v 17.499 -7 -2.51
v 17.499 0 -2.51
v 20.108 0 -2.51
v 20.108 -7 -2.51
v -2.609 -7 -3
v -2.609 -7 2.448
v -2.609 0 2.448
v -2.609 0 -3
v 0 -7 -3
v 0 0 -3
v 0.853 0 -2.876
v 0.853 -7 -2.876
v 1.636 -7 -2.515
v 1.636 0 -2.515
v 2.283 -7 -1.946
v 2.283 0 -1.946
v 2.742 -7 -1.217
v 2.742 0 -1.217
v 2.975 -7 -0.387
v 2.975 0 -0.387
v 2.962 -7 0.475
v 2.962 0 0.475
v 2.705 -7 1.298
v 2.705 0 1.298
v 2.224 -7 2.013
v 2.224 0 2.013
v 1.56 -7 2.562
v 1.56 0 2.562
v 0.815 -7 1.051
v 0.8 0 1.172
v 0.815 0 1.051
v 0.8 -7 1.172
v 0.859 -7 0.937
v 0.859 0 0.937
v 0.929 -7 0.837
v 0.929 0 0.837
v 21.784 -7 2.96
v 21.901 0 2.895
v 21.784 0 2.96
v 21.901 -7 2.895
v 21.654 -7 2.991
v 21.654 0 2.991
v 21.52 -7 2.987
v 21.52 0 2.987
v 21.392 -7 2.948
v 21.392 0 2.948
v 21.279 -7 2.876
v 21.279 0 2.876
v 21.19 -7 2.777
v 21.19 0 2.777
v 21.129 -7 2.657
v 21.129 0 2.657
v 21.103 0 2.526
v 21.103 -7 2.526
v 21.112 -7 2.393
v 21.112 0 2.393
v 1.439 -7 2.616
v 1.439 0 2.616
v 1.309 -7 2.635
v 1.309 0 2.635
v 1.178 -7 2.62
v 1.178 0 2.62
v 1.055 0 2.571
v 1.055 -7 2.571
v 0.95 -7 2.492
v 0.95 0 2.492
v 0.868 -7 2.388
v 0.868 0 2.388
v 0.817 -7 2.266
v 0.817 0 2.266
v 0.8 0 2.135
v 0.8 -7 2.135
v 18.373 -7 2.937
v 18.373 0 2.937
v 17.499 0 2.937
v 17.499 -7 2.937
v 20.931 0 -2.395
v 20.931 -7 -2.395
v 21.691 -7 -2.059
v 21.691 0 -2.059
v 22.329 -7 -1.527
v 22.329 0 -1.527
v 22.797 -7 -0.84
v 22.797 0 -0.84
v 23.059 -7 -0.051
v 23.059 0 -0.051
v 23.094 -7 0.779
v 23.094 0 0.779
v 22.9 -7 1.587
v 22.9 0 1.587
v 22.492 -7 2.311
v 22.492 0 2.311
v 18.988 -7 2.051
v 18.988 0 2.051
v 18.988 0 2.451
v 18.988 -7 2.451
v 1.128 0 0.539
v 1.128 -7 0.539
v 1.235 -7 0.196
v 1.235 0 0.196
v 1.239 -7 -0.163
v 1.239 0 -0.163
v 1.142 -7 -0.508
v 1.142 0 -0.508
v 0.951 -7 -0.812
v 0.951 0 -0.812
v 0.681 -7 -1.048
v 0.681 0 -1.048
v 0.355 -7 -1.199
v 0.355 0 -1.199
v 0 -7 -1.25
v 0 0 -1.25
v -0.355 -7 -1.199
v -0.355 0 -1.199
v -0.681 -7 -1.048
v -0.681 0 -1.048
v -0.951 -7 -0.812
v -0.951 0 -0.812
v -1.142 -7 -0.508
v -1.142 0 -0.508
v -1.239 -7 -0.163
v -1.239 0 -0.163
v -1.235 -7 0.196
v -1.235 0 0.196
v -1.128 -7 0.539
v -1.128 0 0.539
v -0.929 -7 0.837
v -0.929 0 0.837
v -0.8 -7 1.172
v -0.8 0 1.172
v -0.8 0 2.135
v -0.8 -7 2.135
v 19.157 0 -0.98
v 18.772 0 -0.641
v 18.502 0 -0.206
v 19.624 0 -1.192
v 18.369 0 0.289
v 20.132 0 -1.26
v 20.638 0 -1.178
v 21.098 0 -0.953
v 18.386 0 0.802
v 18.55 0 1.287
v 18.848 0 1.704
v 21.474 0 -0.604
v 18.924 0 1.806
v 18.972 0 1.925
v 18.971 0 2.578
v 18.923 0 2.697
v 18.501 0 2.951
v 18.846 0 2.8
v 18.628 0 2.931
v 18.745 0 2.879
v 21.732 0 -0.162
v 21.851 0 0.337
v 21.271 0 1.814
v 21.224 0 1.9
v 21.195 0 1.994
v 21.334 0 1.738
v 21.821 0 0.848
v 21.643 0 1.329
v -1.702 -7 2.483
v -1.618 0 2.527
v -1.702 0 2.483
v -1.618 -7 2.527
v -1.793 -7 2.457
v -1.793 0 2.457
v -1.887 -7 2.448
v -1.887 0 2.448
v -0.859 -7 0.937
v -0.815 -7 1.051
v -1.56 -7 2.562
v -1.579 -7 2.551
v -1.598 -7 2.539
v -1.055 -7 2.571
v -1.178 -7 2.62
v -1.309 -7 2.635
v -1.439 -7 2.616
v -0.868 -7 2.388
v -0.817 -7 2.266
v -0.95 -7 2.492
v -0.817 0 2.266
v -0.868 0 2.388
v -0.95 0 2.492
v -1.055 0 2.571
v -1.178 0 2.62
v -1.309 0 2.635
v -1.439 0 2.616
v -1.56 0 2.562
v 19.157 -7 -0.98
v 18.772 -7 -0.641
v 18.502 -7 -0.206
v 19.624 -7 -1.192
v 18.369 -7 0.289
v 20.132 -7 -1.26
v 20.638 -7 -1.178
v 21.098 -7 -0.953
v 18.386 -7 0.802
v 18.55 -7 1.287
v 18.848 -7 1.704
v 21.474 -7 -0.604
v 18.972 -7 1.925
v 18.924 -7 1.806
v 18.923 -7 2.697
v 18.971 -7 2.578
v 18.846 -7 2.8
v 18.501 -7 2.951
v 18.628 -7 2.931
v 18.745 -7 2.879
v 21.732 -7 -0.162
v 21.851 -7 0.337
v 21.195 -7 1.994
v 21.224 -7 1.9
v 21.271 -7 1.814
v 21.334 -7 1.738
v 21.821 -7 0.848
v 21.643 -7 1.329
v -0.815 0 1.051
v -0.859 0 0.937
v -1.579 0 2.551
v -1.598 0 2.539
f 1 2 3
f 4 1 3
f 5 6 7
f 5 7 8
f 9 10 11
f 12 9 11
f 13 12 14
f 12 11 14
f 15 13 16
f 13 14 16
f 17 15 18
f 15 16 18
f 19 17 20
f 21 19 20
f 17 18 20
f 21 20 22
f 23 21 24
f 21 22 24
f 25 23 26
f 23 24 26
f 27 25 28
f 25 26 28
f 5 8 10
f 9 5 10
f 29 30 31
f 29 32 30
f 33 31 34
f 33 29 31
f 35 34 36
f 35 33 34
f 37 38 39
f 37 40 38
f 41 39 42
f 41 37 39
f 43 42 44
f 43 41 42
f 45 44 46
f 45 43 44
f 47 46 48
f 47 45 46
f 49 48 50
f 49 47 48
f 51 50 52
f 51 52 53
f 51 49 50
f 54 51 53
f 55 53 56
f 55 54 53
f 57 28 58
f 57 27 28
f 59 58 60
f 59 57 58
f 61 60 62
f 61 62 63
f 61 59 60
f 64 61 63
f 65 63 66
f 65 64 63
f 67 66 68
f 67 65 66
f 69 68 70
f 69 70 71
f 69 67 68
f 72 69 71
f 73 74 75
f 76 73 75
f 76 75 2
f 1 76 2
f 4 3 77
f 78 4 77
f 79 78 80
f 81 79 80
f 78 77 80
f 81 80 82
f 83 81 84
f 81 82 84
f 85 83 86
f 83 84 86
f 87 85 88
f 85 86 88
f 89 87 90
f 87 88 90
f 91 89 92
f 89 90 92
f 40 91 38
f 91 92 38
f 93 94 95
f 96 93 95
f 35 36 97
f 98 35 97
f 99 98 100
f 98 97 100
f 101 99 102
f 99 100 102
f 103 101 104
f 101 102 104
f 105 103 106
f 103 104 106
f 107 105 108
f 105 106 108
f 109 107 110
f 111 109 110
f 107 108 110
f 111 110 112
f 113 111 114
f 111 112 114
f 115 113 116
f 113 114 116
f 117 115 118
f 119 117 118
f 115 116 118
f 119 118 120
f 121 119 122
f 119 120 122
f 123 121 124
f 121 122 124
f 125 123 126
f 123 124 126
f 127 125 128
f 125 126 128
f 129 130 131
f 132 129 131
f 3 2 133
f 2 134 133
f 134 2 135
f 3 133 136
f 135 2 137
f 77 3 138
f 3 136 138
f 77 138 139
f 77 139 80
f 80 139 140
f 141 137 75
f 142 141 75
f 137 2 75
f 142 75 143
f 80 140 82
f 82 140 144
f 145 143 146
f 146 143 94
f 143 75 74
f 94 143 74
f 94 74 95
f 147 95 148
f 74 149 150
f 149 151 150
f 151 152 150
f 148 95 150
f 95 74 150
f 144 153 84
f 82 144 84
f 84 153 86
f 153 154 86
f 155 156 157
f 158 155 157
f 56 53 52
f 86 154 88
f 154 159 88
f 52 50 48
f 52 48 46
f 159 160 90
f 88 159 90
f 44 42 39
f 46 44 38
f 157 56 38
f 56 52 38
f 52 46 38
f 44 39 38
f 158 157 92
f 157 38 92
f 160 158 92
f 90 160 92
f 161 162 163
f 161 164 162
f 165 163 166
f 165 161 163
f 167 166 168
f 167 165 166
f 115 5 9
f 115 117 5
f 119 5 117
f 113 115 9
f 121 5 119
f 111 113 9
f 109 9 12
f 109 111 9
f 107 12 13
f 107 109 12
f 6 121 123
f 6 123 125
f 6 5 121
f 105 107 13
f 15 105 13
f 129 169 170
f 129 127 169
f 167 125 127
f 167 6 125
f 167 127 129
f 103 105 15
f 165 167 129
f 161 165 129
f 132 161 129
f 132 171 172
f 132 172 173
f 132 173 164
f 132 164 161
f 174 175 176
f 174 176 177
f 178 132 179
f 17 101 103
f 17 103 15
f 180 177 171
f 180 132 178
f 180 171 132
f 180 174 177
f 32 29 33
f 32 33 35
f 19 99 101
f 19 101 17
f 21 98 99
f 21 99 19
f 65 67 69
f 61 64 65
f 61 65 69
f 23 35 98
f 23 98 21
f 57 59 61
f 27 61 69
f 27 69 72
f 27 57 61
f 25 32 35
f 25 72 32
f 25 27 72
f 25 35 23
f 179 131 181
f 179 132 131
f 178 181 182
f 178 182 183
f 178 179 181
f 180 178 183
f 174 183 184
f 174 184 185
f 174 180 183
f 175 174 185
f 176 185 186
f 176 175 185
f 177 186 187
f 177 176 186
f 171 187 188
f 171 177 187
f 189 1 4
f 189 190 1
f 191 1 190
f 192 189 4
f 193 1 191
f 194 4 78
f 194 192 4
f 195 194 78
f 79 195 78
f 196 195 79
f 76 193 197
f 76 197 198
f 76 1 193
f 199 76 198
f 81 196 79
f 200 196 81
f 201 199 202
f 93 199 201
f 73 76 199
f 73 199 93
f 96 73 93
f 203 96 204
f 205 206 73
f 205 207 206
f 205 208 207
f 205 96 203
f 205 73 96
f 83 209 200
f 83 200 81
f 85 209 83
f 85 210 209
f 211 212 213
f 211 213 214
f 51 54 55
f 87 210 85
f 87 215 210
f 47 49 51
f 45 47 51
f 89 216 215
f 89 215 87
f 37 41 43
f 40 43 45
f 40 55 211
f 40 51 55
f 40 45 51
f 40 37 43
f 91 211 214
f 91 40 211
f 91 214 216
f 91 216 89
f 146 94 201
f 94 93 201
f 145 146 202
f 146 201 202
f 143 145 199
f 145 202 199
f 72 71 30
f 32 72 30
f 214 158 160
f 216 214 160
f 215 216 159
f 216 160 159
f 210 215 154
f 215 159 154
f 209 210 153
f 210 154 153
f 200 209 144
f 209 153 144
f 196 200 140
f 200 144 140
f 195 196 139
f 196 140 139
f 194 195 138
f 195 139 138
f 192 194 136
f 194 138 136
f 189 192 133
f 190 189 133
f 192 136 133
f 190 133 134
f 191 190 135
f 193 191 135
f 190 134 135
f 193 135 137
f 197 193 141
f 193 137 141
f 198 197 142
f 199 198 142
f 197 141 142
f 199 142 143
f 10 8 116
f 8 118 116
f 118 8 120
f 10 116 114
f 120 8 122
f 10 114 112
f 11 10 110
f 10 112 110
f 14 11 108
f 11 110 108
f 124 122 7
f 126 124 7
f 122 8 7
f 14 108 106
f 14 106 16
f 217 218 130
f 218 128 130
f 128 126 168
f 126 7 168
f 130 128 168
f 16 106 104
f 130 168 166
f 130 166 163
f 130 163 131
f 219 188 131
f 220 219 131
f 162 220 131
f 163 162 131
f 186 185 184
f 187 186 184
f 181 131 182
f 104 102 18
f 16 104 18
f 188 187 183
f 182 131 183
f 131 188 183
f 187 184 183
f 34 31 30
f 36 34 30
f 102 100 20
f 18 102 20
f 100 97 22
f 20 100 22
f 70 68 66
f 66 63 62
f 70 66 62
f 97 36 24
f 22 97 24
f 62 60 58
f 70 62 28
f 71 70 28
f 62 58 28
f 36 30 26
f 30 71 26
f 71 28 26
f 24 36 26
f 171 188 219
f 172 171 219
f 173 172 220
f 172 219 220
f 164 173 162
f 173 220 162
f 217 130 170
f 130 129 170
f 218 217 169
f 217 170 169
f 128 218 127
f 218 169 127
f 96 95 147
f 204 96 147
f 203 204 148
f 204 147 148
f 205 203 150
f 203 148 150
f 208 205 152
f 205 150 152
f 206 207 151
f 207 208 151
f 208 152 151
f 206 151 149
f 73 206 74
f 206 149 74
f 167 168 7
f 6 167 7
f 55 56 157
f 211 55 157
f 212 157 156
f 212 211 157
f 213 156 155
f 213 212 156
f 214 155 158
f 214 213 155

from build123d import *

# Parameters (mm, degrees)
F1_DEPTH    = 7
F2_R        = 0.5
F2_2_R      = 0.5
F3_T1_DEPTH = 11.1105344099


# Not quite as in the source:
# - a fillet or chamfer that OpenCascade refuses, or shapes differently, is made with other operations: its cross-section is extruded or revolved along the edge and cut away or added


with BuildPart() as f1:
    # F0 (on Front) → F1 (new body)
    with BuildSketch(Plane.XZ):
        with BuildLine():
            Line((-0.8, 0.9604686356), (-0.8, 2.891366459))
            ThreePointArc((-0.8, 2.891366459), (-1.2865824769, 2.7101117191), (-1.734622404, 2.4476693232))
            Line((-1.734622404, 2.4476693232), (-2.6087118245, 2.4476693232))
            Line((-2.6087118245, 2.4476693232), (-2.6087118245, 1.4814258728))
            Line((-2.6087118245, 1.4814258728), (-2.6087118245, -1.4814258728))
            Line((-2.6087118245, -1.4814258728), (-2.6087118245, -3))
            Line((-2.6087118245, -3), (0, -3))
            ThreePointArc((0, -3), (2.9727175595, -0.4036710437), (0.8, 2.891366459))
            Line((0.8, 2.891366459), (0.8, 0.9604686356))
            ThreePointArc((0.8, 0.9604686356), (0, -1.25), (-0.8, 0.9604686356))
        make_face()
    extrude(amount=F1_DEPTH)

    # F2
    f2_edges = [f1.edges().sort_by_distance(p)[0] for p in [
        (-0.8, -3.5, 2.891366),
        (-0.8, -3.5, 0.960469),
        (0.8, -3.5, 0.960469),
        (0.8, -3.5, 2.891366),
        (-1.734622, -3.5, 2.447669),
    ]]
    fillet(f2_edges, radius=F2_R)


with BuildPart() as f1b:
    # F0 (on Front) → F1, piece 2 (new body)
    with BuildSketch(Plane.XZ):
        with BuildLine():
            Line((18.987874046, 1.8343775348), (18.987874046, 3.2728132508))
            ThreePointArc((18.987874046, 3.2728132508), (18.6707434577, 3.1230948845), (18.373251642, 2.9373907681))
            Line((18.373251642, 2.9373907681), (17.4991622215, 2.9373907681))
            Line((17.4991622215, 2.9373907681), (17.4991622215, 1.9711473178))
            Line((17.4991622215, 1.9711473178), (17.4991622215, -0.9917044279))
            Line((17.4991622215, -0.9917044279), (17.4991622215, -2.5102785551))
            Line((17.4991622215, -2.5102785551), (20.107874046, -2.5102785551))
            ThreePointArc((20.107874046, -2.5102785551), (23.0805916054, 0.0860504012), (20.907874046, 3.3810879039))
            Line((20.907874046, 3.3810879039), (21.227874046, 1.8343775348))
            ThreePointArc((21.227874046, 1.8343775348), (20.107874046, -1.2602785551), (18.987874046, 1.8343775348))
        make_face()
    extrude(amount=F1_DEPTH)

    # F2#2
    f2_2_edges = [f1b.edges().sort_by_distance(p)[0] for p in [
        (18.987874, -3.5, 1.834378),
        (20.907874, -3.5, 3.381088),
        (21.227874, -3.5, 1.834378),
    ]]
    fillet(f2_2_edges, radius=F2_2_R)

    # F3: fillet of radius 0.5 on 1 edges, made by hand

    # F3_s2 → F3_t1 (cut)
    with BuildSketch(Plane.XZ.offset(-2.055267205)):
        with BuildLine():
            ThreePointArc((18.987874046, 2.4507063688), (18.7982679876, 2.8426956557), (18.373251642, 2.9373907681))
            ThreePointArc((18.373251642, 2.9373907681), (18.6707434577, 3.1230948845), (18.987874046, 3.2728132508))
            Line((18.987874046, 3.2728132508), (18.987874046, 2.4507063688))
        make_face()
    extrude(amount=F3_T1_DEPTH, mode=Mode.SUBTRACT)


solid = Compound([f1.part, f1b.part])
